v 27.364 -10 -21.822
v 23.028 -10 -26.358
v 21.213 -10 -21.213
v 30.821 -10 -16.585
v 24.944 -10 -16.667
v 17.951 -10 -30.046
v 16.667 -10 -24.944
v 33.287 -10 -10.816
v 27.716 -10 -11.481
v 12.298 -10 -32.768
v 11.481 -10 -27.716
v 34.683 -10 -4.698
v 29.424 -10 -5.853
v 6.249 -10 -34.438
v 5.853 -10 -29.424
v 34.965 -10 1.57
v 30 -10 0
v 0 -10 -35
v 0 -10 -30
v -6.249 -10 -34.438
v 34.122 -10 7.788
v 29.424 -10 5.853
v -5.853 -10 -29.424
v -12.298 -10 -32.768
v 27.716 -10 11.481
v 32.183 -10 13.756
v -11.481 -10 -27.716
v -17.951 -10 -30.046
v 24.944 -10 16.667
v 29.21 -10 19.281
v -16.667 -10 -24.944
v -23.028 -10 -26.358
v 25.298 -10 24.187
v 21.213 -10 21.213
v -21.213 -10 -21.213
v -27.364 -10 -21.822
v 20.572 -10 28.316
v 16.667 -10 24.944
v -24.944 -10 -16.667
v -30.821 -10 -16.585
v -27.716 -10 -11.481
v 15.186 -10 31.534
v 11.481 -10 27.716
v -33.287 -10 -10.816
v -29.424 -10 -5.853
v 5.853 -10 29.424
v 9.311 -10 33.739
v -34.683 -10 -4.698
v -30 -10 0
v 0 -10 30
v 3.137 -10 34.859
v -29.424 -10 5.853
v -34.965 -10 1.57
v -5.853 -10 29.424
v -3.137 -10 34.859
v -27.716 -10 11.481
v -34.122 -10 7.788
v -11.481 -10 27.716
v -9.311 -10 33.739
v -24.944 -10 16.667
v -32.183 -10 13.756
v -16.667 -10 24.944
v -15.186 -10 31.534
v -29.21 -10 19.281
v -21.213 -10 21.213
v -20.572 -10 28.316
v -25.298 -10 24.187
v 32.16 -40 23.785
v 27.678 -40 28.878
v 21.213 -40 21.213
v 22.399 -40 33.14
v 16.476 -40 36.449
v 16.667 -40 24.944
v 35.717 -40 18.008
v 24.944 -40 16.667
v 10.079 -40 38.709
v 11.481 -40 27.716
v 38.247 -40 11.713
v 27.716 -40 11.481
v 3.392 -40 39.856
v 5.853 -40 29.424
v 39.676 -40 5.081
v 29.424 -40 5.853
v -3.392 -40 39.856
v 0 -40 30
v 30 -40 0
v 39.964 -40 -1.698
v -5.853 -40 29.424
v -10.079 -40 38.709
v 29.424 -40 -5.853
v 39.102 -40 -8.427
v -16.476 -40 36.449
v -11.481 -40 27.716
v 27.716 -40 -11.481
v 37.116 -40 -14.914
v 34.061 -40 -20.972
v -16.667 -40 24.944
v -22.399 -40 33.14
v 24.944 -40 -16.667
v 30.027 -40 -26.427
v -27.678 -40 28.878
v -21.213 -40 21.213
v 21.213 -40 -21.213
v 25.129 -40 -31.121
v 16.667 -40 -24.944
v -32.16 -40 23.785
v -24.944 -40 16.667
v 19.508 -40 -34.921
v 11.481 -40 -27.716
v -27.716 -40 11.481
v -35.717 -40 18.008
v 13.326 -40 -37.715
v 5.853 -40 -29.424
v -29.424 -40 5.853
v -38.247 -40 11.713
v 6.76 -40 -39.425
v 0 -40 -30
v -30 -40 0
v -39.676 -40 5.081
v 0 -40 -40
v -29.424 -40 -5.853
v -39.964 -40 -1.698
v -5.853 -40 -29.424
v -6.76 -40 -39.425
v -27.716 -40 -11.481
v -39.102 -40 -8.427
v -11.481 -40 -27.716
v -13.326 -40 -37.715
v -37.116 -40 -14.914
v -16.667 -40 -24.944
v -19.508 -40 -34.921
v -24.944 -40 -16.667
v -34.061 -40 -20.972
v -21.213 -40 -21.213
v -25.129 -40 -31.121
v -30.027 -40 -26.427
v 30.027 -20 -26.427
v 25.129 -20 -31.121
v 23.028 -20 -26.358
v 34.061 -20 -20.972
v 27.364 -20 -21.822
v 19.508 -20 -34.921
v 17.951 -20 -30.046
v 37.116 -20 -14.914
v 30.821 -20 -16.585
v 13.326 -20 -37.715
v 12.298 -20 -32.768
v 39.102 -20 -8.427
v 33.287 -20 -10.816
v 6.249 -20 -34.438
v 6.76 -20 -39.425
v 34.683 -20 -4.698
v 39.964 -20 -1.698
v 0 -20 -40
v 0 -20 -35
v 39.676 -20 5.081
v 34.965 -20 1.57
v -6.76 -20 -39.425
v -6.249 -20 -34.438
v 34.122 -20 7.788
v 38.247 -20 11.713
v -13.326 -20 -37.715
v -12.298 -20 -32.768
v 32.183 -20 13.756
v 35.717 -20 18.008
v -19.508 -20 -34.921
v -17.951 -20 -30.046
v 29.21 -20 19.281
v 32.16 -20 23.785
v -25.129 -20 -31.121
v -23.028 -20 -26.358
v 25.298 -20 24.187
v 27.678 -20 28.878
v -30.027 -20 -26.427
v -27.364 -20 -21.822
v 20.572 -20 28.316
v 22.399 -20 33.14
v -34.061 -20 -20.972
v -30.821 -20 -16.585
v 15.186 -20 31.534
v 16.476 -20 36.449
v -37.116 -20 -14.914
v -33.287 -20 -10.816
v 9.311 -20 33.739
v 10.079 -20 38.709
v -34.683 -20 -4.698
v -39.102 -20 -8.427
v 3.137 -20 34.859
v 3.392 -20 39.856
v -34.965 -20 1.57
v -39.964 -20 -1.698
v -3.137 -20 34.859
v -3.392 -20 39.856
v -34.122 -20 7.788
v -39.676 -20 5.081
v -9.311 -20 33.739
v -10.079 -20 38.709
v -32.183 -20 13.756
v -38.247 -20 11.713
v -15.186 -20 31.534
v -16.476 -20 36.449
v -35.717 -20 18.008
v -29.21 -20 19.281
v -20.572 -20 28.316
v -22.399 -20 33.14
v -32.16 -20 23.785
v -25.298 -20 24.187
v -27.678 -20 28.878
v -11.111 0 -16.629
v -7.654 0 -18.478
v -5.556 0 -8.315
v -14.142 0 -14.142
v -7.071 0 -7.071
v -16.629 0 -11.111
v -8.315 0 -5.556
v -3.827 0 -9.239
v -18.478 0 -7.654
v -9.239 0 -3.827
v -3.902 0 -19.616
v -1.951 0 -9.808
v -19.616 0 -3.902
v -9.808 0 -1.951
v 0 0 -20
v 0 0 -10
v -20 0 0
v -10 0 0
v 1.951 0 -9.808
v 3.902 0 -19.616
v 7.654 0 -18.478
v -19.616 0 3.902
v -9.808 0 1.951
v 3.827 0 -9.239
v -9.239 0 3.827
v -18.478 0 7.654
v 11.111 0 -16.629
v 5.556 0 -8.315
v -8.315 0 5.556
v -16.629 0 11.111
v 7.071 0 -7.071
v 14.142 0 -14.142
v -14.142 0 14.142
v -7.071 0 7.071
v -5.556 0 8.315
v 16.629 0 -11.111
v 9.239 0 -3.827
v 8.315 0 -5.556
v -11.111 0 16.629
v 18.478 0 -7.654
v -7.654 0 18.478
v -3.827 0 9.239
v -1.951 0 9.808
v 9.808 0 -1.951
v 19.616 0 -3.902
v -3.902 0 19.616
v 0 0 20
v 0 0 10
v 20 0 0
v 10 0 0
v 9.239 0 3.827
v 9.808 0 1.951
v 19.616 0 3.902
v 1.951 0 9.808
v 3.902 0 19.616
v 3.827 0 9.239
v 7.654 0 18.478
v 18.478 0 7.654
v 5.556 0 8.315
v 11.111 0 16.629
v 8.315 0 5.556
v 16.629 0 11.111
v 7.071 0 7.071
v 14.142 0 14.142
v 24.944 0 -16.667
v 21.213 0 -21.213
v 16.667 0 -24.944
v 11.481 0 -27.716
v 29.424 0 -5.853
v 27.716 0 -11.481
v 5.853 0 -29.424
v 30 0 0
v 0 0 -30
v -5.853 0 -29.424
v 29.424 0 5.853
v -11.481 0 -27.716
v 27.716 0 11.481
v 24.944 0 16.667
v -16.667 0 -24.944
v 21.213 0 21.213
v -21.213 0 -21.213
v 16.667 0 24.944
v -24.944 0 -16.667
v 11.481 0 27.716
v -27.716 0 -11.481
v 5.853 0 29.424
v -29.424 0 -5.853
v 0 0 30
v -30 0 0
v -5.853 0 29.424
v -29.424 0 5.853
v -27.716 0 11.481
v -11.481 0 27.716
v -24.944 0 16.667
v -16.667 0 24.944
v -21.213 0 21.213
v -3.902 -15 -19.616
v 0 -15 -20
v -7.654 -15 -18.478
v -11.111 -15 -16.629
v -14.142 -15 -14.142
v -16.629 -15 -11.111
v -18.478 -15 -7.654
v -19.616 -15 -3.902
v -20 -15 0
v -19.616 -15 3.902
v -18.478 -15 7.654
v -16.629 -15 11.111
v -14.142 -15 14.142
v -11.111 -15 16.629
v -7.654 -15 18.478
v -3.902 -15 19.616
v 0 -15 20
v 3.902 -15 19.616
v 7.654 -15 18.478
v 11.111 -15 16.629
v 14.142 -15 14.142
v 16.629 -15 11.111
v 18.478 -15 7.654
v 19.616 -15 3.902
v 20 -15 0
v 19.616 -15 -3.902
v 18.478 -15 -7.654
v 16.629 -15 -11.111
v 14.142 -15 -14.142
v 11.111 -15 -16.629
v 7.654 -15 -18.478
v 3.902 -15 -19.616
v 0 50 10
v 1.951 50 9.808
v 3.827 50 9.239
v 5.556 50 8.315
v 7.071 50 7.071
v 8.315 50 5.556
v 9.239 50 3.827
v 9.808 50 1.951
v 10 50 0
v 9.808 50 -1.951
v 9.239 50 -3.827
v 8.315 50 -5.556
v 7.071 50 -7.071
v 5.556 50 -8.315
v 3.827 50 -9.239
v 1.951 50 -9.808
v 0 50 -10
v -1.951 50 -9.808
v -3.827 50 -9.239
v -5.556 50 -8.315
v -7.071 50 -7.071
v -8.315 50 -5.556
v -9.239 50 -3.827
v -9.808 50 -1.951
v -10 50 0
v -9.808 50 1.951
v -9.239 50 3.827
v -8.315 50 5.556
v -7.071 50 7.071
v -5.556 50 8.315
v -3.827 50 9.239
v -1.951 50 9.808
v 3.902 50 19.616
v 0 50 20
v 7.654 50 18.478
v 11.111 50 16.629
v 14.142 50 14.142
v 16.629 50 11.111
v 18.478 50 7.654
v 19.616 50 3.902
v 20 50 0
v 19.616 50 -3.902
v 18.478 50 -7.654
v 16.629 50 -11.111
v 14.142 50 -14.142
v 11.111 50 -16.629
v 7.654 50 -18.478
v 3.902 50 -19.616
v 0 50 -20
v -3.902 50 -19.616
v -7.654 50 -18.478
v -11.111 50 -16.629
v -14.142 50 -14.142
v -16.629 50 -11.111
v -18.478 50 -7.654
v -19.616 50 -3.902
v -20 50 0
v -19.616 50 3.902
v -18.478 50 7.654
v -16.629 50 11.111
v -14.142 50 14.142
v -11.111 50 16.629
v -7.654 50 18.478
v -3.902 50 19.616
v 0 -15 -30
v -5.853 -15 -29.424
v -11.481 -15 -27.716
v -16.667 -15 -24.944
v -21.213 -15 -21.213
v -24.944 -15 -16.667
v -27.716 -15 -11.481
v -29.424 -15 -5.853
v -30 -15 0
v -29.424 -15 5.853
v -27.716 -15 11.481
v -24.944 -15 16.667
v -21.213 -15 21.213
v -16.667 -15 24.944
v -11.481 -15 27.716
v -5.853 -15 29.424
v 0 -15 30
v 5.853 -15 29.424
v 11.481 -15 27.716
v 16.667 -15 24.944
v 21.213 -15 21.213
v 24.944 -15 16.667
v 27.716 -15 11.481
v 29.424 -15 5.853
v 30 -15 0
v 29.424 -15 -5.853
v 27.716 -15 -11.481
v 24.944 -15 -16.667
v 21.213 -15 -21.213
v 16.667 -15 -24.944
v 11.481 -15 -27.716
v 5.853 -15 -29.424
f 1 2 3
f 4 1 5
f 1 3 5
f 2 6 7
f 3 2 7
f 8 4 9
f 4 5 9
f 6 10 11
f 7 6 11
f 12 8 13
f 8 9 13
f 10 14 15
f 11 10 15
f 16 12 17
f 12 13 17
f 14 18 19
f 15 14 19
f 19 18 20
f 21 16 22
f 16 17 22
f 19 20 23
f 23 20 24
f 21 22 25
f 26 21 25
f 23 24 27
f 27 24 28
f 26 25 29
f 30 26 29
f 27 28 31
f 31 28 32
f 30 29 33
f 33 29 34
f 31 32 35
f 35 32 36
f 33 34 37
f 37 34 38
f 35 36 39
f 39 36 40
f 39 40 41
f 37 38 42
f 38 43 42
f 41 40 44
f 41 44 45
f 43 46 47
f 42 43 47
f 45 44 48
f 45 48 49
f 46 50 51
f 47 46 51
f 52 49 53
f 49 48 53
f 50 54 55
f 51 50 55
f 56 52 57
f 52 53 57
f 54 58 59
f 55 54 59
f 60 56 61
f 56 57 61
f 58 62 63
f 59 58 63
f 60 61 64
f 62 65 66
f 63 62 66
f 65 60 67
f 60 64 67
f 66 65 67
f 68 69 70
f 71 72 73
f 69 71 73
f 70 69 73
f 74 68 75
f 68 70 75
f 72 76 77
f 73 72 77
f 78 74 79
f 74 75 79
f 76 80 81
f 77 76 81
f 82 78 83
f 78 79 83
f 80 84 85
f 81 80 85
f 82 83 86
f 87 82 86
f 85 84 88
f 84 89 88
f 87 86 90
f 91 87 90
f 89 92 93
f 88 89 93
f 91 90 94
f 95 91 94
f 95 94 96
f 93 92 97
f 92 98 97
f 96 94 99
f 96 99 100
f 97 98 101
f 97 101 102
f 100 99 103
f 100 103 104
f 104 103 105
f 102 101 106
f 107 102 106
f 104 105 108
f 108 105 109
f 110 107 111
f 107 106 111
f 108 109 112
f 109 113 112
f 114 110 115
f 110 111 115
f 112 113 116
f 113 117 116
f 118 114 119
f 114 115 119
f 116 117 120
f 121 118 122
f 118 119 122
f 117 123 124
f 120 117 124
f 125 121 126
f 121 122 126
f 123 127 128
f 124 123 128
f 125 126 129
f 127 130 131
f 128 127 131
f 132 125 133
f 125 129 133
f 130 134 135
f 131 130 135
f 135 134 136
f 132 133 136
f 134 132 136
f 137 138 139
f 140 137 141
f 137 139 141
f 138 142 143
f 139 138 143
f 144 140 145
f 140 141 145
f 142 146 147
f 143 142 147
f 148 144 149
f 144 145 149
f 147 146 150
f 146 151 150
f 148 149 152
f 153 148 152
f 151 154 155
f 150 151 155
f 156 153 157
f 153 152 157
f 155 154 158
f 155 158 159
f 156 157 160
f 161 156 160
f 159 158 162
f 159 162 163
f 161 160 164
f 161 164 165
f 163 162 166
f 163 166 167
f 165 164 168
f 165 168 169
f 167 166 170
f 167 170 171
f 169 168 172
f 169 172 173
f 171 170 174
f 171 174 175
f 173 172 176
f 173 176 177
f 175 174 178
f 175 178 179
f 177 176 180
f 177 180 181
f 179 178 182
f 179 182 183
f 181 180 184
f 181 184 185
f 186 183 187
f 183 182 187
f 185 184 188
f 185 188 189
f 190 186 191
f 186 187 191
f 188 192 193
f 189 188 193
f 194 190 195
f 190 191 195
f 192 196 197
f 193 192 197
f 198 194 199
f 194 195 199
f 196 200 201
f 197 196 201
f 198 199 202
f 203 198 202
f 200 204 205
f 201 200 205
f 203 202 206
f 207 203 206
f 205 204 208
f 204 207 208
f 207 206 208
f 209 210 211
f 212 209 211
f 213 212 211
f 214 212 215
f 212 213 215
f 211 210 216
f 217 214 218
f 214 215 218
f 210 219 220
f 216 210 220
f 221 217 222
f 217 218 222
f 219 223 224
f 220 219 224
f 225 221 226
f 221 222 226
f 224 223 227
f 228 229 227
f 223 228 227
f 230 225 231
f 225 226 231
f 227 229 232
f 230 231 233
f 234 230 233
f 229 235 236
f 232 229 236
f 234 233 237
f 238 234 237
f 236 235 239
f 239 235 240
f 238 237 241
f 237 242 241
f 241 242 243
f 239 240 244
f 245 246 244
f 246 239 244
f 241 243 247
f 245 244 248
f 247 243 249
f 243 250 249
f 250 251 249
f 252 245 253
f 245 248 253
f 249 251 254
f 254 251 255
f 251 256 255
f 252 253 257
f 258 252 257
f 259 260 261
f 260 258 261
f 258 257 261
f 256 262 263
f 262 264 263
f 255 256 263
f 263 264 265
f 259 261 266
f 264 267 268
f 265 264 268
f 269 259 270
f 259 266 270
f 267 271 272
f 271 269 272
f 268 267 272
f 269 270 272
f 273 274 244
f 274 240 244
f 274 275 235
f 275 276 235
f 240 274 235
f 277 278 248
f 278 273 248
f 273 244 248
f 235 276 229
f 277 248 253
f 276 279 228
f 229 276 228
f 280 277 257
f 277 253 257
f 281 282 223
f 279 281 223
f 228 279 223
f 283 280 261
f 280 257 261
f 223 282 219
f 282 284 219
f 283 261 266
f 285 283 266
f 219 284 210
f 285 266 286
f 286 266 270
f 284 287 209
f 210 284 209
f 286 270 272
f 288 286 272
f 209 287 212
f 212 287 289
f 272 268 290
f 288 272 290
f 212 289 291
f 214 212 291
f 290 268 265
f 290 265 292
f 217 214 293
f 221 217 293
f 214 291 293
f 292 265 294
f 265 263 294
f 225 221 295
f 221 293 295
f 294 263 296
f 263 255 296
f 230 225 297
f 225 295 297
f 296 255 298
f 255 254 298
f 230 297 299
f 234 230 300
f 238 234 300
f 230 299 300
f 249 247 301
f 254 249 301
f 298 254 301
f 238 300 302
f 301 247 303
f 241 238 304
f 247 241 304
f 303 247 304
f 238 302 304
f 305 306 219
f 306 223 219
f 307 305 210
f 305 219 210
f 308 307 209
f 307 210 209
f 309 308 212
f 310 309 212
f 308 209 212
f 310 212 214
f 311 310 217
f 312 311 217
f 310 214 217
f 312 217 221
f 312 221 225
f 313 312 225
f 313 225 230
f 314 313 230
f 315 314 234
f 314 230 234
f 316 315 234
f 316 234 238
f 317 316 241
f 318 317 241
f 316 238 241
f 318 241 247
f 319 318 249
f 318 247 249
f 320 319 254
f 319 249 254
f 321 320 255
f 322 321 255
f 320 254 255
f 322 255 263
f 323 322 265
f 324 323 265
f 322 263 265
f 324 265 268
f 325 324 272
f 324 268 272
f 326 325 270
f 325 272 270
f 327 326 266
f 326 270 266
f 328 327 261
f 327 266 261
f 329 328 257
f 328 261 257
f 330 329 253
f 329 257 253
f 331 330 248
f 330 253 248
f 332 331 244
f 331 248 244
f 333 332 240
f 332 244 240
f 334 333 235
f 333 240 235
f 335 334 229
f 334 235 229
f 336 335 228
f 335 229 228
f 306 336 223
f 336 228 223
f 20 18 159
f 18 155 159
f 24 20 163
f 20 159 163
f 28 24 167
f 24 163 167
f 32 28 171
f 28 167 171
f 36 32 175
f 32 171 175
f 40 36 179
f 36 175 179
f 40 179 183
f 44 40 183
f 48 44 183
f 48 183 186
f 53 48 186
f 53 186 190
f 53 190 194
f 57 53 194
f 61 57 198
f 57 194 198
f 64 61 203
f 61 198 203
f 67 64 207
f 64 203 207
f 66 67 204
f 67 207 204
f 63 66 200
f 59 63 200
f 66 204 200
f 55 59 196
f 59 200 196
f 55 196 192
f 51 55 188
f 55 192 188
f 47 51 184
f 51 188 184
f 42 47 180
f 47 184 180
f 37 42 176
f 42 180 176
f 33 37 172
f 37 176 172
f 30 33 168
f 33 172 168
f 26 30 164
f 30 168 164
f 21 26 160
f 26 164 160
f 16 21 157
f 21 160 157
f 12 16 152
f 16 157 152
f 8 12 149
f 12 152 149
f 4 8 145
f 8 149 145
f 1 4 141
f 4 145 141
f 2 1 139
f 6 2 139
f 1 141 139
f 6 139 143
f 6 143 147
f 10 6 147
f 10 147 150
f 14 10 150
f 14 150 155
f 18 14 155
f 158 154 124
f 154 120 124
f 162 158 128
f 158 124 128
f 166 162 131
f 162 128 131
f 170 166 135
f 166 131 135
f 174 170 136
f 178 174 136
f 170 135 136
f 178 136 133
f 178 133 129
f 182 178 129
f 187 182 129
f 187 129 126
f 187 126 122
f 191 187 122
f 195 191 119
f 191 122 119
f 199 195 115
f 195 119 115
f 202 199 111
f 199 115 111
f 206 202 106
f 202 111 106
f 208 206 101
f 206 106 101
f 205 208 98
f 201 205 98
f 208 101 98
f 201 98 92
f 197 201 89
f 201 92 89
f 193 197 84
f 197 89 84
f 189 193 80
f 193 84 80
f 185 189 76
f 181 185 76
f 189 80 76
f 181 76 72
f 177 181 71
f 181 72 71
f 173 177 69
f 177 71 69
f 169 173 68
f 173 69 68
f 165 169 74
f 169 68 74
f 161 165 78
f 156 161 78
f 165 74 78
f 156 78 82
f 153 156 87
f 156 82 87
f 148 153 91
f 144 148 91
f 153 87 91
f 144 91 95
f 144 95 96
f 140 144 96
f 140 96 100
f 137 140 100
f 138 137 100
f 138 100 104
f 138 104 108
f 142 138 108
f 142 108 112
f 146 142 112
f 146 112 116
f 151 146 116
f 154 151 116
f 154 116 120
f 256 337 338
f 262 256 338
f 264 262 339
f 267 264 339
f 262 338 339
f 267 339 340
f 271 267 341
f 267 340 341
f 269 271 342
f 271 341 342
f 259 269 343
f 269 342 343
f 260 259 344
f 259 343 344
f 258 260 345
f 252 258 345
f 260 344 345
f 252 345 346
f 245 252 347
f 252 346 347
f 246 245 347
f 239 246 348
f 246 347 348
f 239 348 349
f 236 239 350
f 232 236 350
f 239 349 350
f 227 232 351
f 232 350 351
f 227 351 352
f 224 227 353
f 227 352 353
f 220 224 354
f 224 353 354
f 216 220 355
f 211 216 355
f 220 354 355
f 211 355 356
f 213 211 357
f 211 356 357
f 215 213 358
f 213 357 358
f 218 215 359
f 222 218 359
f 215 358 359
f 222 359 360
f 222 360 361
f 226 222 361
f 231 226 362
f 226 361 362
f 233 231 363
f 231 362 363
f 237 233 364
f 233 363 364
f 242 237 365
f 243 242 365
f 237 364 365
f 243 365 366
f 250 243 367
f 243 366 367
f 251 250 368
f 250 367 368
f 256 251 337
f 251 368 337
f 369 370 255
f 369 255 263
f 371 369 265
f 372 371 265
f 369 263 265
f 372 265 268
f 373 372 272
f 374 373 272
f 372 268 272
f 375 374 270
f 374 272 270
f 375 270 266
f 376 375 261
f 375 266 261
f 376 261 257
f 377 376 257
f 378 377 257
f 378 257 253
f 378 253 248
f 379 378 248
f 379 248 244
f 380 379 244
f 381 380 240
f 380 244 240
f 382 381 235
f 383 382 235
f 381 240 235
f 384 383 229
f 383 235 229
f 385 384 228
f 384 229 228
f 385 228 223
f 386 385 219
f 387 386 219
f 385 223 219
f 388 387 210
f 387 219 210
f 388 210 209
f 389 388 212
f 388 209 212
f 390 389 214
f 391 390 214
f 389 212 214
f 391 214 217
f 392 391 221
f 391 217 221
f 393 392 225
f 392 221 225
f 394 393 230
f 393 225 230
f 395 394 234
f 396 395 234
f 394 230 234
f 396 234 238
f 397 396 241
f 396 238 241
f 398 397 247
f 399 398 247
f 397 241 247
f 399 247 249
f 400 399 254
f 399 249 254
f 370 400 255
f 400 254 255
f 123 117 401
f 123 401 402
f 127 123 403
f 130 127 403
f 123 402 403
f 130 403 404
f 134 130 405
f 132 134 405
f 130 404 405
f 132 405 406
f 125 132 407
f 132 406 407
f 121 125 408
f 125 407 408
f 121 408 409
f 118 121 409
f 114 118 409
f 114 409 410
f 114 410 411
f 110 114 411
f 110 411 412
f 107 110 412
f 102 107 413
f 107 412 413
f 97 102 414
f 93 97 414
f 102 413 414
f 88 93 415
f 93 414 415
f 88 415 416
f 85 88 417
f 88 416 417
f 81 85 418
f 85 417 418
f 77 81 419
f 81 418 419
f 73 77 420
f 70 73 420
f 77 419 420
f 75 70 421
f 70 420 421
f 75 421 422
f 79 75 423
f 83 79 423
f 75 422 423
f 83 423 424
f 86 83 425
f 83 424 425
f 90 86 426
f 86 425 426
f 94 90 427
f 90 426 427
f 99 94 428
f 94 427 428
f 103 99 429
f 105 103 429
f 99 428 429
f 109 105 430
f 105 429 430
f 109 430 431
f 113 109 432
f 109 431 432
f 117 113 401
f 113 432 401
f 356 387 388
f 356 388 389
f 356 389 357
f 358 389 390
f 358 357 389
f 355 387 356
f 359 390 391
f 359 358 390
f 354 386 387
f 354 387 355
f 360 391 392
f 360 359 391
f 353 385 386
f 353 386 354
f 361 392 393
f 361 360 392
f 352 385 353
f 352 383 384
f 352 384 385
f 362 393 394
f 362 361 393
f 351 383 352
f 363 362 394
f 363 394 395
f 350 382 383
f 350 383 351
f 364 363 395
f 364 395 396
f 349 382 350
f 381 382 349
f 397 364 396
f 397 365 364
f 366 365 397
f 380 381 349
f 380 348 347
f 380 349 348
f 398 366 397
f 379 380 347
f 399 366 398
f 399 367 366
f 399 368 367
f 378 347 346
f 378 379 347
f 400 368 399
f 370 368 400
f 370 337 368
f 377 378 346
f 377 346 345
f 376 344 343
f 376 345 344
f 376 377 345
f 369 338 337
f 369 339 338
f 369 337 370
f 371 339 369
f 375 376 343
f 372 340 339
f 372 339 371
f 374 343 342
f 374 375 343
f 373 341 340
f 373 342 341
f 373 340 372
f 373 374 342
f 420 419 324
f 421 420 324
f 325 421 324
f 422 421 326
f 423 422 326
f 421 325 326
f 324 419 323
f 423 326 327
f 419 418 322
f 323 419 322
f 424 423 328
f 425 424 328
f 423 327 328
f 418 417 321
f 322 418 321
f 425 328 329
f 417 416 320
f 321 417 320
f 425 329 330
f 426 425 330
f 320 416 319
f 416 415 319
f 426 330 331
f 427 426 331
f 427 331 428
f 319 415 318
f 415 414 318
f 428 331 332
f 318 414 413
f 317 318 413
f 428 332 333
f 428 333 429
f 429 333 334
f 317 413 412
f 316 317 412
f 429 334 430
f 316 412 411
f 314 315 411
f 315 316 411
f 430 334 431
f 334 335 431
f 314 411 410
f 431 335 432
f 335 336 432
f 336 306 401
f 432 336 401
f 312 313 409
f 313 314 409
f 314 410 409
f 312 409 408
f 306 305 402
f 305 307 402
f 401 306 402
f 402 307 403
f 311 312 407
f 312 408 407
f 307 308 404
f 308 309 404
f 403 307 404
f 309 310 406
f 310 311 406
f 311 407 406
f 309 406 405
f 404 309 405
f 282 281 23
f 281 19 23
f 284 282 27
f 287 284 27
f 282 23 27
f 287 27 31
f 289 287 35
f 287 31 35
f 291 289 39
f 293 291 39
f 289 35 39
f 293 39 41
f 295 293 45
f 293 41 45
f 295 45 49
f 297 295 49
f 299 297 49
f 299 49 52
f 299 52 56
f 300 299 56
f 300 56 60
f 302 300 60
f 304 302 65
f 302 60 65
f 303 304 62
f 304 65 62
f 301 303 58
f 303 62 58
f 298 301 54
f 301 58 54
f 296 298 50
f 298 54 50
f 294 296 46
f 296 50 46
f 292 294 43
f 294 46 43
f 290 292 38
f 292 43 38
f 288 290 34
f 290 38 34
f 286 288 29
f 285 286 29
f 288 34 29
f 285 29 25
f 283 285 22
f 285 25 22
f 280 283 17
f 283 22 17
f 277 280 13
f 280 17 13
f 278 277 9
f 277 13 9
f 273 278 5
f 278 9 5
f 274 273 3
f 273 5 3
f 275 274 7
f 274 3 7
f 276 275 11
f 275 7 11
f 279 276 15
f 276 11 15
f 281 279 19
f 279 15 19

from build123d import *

# Parameters (mm, degrees)
SKETCH1_R           = 20
BOSS_EXTRUDE1_DEPTH = 50
SKETCH2_R           = 10
CUT_EXTRUDE1_DEPTH  = 50


with BuildPart() as part:
    # Sketch1 → Boss-Extrude1 (new body)
    with BuildSketch(Plane(origin=(0, 0, 0), x_dir=(1, 0, 0), z_dir=(0, 1, 0))):
        with Locations(Location((0, 0, 0), (0, 0, 270))):
            Circle(SKETCH1_R)
    extrude(amount=BOSS_EXTRUDE1_DEPTH)

    # Sketch2 → Cut-Extrude1 (cut)
    with BuildSketch(Plane(origin=(0, 50, 0), x_dir=(1, 0, 0), z_dir=(0, 1, 0))):
        with Locations(Location((0, 0, 0), (0, 0, 270))):
            Circle(SKETCH2_R)
    extrude(amount=-CUT_EXTRUDE1_DEPTH, mode=Mode.SUBTRACT)


with BuildPart() as body_2:
    # Sketch4 → Revolve1 (revolve)
    with BuildSketch(Plane(origin=(0, 0, 0), x_dir=(0, 0, -1), z_dir=(1, 0, 0))):
        Polygon((30, 0), (30, -10), (35, -10), (35, -20), (40, -20), (40, -40), (30, -40), (30, -15), (20, -15), (20, 0), align=None)
    revolve(axis=Axis((0, 0, 0), (0, 1, 0)))


solid = Compound([part.part, body_2.part])
